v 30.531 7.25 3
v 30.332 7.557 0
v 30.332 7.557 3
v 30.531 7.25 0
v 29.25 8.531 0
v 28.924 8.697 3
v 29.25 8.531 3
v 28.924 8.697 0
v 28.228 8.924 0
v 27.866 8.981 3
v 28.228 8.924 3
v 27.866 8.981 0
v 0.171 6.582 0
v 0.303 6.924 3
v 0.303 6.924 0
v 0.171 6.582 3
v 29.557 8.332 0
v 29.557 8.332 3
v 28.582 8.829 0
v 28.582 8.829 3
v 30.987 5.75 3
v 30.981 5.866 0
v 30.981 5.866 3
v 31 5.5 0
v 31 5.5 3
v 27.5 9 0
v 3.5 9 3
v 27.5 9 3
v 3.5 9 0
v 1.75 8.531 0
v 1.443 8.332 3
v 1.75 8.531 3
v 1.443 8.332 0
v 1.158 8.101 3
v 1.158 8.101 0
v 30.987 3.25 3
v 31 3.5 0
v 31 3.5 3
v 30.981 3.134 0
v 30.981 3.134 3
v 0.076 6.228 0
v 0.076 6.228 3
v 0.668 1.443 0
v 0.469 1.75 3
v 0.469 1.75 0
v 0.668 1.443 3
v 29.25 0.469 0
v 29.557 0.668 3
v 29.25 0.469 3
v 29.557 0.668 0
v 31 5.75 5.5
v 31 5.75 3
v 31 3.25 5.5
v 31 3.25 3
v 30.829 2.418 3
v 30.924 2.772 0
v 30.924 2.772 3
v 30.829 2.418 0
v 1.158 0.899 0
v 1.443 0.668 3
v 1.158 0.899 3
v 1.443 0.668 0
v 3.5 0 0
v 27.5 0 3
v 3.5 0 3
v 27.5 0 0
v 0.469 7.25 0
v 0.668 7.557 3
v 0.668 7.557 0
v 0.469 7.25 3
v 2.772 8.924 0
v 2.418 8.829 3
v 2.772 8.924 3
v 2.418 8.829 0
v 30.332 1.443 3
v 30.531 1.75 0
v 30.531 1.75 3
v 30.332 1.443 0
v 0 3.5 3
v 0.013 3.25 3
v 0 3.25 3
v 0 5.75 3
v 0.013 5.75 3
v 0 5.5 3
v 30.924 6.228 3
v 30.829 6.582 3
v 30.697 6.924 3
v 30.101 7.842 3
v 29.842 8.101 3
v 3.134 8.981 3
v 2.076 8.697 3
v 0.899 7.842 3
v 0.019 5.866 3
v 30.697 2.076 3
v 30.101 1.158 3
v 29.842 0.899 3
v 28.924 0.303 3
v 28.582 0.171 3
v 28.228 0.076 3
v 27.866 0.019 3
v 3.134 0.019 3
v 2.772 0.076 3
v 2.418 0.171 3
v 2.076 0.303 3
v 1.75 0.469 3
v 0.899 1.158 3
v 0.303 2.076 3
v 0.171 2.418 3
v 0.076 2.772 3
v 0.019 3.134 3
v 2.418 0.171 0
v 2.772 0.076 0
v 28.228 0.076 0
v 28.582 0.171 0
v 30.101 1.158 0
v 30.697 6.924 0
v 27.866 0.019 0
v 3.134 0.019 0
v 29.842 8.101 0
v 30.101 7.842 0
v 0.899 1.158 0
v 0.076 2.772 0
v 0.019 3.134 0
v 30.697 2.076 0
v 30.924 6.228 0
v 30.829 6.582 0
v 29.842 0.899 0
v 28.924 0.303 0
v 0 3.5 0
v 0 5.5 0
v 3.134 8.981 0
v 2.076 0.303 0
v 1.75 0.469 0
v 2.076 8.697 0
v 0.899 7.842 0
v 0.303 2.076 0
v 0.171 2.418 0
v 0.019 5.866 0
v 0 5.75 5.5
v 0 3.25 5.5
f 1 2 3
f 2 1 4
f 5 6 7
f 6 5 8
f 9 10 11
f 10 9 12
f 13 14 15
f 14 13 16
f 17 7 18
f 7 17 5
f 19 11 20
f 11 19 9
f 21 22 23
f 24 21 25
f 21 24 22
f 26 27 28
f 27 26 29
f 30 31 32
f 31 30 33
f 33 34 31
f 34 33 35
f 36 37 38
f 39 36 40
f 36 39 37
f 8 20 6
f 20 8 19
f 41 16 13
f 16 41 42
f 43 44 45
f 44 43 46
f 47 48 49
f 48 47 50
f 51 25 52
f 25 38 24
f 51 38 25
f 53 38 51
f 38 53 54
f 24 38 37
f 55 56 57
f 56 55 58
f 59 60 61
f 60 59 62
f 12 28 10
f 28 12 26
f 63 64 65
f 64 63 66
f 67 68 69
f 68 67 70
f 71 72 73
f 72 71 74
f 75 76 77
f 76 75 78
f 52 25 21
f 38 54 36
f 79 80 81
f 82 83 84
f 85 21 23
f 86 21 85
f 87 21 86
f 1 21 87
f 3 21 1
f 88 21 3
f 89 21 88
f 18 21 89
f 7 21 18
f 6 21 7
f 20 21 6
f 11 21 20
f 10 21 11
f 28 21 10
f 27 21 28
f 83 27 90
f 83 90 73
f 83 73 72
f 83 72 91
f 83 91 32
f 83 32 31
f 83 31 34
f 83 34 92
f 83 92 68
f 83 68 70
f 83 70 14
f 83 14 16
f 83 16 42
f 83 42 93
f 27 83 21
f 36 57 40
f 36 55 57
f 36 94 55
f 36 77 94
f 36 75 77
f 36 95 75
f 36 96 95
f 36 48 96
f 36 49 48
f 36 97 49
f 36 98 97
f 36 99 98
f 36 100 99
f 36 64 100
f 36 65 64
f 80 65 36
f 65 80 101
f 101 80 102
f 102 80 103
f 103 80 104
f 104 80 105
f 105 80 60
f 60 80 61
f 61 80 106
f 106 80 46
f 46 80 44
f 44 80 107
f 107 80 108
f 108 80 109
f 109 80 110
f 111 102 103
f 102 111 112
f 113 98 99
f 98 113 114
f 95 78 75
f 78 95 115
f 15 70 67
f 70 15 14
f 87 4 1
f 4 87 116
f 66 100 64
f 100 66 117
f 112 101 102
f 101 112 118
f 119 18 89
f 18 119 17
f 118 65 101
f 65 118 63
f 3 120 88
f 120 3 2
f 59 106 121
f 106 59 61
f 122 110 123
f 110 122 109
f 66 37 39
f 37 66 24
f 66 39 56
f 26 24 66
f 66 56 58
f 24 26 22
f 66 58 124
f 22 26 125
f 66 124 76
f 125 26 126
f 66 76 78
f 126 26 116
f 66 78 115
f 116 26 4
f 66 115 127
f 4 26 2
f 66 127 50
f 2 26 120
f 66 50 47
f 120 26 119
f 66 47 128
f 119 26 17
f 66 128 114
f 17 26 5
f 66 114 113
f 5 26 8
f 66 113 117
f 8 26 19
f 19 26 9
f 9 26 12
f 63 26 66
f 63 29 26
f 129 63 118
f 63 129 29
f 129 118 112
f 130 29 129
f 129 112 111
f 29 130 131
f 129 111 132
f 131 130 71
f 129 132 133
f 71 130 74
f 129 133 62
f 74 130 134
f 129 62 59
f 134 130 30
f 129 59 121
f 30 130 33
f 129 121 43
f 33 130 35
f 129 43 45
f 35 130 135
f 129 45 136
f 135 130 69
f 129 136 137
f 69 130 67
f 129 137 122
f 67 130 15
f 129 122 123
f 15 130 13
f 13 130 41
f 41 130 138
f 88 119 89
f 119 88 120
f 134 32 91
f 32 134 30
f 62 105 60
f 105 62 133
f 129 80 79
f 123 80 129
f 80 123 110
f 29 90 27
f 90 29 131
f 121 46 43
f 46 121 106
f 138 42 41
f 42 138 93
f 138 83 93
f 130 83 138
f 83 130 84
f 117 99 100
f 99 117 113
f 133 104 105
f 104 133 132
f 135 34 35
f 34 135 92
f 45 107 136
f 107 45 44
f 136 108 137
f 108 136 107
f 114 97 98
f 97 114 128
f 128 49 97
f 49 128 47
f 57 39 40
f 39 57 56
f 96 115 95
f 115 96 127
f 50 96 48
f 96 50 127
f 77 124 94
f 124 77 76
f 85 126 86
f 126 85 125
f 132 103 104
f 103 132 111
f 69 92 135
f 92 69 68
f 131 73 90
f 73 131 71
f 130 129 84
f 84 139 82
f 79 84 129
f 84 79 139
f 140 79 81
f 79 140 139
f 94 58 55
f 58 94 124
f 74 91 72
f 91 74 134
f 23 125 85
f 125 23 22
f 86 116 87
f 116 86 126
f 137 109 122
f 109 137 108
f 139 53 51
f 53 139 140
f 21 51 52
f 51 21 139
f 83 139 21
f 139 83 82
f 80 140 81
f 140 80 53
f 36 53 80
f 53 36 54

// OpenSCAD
$fn=60;

module rcube(size, radius) {
    hull() {
        translate([radius, radius]) cylinder(r = radius, h = size[2]);
        translate([size[0] - radius, radius]) cylinder(r = radius, h = size[2]);
        translate([size[0] - radius, size[1] - radius]) cylinder(r = radius, h = size[2]);
        translate([radius, size[1] - radius]) cylinder(r = radius, h = size[2]);
    }
}

rcube(size=[31,9,3], radius=3.5);

translate([0,3.25,3])
    cube(size=[31,2.5,2.5]);
